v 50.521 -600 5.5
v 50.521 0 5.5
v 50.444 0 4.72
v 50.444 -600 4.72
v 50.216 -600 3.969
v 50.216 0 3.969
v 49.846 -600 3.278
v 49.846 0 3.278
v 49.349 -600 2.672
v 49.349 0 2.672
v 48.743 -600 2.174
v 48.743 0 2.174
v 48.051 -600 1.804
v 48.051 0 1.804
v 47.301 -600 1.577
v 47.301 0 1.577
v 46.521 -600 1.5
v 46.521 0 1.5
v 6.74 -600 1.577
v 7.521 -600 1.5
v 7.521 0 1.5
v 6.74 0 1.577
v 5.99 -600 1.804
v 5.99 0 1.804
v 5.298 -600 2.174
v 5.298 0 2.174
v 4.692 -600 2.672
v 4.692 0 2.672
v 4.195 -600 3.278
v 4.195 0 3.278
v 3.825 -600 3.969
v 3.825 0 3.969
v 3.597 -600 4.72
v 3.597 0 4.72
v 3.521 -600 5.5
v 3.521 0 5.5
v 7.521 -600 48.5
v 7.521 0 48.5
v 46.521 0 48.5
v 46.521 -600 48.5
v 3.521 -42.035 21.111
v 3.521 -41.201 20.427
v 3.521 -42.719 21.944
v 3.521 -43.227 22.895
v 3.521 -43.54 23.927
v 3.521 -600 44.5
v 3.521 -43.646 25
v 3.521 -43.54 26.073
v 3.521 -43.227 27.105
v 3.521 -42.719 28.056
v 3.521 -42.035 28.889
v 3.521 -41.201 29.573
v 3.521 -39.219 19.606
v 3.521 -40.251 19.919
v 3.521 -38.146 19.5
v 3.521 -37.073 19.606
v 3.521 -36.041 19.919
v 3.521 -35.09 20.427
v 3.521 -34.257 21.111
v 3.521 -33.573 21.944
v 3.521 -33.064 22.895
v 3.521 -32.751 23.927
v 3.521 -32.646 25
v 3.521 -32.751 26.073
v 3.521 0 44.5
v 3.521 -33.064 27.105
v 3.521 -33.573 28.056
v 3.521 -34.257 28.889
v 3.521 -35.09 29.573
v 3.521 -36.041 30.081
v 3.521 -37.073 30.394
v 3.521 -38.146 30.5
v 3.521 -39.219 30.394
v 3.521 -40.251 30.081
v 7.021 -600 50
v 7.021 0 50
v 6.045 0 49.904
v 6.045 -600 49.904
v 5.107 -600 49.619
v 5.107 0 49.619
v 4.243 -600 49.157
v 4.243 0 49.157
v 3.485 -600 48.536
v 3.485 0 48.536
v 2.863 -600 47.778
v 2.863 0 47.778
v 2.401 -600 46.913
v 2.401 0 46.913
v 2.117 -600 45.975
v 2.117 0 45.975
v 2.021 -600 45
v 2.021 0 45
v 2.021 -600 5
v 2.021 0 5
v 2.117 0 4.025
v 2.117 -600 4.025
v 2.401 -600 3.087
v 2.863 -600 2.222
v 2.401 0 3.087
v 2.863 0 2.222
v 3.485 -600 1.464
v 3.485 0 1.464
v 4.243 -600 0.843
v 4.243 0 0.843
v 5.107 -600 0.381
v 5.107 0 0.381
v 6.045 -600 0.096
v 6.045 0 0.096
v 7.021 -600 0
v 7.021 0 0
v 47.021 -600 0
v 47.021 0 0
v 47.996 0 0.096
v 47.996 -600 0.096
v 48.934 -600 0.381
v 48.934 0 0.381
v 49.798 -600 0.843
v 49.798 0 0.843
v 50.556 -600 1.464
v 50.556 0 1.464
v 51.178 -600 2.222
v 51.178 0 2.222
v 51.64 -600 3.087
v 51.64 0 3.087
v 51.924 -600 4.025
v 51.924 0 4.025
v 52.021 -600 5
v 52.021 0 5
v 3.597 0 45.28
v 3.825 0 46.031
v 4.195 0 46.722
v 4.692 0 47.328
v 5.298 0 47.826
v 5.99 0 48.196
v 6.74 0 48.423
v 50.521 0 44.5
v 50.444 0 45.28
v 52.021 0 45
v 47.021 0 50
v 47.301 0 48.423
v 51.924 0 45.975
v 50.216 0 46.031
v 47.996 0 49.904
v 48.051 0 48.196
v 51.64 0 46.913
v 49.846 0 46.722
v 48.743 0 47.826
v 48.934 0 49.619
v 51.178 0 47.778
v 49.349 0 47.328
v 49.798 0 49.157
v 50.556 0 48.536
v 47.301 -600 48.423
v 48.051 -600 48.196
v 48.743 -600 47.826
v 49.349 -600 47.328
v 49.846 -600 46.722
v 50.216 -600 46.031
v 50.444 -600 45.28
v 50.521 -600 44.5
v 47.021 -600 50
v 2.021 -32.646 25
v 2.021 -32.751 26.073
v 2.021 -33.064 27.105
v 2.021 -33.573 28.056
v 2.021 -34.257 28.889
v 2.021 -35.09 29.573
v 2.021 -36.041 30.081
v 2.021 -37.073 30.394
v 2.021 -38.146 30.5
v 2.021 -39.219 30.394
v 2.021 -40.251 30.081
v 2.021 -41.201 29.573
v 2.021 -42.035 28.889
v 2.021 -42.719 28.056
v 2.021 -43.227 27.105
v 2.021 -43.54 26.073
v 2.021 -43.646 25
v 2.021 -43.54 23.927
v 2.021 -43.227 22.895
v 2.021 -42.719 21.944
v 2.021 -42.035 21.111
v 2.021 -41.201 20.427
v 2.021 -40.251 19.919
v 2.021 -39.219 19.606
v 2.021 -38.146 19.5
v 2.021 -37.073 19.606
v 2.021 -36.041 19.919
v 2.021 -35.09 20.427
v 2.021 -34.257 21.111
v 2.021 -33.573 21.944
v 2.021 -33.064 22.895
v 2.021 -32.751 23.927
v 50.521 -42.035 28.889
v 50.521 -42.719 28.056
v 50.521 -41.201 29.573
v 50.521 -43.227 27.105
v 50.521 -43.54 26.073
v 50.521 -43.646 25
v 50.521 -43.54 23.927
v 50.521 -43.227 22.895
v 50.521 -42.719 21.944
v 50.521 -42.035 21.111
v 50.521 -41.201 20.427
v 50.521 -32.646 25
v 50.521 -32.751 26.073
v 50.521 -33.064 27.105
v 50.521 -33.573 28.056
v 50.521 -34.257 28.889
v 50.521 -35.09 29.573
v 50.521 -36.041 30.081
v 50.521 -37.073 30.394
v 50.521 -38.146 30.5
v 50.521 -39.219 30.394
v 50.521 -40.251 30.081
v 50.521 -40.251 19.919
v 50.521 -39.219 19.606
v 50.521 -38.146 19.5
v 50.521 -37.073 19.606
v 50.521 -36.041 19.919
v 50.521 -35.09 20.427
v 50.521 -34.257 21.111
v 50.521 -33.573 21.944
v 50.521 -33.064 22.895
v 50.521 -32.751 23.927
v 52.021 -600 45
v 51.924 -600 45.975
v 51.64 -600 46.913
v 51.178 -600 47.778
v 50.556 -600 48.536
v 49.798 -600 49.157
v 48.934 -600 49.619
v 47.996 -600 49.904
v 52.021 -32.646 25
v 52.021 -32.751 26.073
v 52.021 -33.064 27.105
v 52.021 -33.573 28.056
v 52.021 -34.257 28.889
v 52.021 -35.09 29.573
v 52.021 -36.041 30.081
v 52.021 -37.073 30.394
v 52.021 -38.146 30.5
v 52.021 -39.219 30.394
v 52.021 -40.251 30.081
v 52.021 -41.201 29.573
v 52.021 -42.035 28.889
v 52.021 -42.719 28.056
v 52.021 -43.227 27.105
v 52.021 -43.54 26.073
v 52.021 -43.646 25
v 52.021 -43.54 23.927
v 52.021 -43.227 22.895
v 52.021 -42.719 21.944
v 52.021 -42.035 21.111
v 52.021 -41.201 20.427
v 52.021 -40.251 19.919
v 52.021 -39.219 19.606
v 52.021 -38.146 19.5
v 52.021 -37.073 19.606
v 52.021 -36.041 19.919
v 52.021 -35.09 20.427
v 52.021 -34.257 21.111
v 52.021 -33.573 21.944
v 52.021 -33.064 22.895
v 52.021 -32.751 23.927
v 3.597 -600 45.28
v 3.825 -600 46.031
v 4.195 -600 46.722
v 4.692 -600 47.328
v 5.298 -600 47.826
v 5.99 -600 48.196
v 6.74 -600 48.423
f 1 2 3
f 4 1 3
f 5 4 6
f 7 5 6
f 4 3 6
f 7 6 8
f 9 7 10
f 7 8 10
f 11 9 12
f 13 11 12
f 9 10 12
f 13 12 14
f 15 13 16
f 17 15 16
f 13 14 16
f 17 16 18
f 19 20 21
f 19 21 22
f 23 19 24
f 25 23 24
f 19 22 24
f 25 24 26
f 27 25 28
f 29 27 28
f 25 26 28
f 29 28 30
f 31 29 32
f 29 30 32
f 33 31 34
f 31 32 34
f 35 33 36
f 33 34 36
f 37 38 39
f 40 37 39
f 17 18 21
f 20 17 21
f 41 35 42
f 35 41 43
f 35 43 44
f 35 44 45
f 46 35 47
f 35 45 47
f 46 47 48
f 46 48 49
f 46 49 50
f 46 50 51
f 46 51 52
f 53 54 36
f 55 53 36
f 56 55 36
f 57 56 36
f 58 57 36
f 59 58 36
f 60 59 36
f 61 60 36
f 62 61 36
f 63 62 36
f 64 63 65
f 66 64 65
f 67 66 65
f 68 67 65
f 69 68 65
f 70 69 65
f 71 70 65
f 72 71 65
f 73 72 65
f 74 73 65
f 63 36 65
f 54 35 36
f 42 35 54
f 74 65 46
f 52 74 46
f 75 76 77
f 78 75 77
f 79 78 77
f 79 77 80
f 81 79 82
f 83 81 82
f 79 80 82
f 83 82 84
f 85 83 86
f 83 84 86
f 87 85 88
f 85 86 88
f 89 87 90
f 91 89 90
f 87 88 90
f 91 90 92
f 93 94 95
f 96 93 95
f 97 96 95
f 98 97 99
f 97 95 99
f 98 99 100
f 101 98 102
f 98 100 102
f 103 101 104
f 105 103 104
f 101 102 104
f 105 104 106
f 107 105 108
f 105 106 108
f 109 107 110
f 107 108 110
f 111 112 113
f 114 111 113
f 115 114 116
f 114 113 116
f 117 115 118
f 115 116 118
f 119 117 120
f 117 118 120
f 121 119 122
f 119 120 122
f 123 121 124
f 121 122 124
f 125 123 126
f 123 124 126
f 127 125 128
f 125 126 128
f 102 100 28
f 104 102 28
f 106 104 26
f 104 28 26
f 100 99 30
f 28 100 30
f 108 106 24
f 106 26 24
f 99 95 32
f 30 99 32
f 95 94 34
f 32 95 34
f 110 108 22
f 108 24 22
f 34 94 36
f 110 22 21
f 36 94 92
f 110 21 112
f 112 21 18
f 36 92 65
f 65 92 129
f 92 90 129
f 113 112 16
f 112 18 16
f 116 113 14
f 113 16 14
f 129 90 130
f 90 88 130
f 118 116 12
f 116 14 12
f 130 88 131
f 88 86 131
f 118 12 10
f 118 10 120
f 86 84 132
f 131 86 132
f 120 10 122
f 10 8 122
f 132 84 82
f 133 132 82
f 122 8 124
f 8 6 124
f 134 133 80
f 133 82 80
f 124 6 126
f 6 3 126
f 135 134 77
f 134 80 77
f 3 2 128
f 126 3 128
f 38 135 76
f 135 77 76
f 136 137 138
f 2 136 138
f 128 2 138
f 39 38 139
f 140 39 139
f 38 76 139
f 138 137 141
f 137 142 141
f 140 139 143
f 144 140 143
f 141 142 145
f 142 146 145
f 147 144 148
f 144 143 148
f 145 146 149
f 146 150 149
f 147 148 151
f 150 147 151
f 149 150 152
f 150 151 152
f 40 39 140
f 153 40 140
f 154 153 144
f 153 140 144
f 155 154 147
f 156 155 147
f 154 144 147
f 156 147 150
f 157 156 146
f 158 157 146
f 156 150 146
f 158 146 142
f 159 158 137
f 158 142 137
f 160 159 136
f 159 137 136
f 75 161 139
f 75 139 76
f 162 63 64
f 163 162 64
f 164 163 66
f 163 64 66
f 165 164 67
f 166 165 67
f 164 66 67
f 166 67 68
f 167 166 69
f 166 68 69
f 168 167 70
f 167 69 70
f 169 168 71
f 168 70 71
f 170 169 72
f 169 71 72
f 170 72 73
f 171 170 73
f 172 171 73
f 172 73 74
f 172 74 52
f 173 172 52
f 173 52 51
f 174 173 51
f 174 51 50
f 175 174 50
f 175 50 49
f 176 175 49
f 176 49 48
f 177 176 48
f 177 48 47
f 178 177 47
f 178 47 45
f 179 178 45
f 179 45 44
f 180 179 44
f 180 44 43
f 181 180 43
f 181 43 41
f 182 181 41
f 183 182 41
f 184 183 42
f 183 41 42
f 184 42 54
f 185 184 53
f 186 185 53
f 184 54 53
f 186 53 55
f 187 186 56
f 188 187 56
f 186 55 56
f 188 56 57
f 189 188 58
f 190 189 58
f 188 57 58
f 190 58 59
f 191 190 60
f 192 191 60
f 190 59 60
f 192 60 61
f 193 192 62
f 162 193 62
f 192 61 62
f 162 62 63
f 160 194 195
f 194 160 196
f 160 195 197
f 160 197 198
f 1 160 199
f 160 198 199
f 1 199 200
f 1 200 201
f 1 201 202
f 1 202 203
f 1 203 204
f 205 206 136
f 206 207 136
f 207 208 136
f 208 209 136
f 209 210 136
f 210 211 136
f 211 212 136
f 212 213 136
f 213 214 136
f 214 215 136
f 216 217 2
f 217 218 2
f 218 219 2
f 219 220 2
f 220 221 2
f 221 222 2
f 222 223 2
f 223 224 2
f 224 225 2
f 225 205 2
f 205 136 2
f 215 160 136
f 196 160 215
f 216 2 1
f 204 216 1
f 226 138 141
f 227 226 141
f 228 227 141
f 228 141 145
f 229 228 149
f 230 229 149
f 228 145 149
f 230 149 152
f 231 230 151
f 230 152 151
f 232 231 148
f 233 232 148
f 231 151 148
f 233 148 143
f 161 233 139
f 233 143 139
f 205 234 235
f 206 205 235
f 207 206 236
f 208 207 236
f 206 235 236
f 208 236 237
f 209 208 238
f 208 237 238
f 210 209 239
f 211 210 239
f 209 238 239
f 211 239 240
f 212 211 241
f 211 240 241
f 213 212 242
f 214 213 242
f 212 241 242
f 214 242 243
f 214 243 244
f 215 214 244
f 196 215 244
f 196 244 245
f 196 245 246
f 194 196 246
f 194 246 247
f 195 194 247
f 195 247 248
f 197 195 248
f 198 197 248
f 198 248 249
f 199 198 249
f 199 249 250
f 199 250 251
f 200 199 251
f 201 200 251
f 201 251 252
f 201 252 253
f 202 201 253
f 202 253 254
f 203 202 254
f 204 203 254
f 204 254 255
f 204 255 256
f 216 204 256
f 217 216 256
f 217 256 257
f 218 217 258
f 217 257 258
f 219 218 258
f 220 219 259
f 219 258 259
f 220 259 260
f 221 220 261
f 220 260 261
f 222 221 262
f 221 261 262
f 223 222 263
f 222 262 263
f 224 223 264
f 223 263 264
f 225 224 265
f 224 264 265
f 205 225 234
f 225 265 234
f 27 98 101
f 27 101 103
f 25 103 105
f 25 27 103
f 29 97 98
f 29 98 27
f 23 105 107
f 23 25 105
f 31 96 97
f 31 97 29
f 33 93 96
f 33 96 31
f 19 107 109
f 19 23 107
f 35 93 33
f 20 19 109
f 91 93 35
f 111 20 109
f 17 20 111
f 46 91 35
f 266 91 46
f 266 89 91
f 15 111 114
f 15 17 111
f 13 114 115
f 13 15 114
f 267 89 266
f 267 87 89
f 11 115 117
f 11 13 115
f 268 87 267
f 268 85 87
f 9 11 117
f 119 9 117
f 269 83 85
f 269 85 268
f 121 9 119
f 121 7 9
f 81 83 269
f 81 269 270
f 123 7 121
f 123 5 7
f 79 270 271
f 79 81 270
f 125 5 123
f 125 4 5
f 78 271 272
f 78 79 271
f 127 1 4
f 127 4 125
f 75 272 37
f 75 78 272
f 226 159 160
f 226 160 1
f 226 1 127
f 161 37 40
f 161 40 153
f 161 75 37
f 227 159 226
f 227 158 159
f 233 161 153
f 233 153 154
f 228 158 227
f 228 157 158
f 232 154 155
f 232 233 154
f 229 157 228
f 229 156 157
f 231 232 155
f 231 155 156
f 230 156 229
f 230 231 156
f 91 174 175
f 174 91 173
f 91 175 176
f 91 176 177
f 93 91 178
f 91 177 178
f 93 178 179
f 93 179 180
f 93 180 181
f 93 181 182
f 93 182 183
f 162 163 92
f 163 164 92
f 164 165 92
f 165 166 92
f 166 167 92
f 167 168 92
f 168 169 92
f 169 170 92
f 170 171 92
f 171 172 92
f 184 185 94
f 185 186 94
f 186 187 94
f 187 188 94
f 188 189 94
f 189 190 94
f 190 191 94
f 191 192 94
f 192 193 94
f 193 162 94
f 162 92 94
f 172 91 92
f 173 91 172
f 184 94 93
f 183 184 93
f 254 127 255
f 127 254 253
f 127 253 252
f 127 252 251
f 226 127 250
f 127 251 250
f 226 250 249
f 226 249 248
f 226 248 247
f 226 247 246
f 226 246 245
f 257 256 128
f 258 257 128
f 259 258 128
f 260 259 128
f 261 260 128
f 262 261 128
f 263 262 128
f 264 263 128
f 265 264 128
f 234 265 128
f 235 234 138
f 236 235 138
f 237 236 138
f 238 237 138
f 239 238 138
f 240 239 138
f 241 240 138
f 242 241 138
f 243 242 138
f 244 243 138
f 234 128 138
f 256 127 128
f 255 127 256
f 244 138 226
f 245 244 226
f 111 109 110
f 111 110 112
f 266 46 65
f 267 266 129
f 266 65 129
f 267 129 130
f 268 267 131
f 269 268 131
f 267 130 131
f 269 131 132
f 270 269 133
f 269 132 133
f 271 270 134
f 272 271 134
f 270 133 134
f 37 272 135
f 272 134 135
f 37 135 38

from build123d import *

# Parameters (mm, degrees)
F1_DEPTH = 600
F2_R     = 5.5
F3_DEPTH = 100


with BuildPart() as f1:
    # F0 (on Front) → F1 (new body)
    with BuildSketch(Plane.XZ):
        with BuildLine():
            ThreePointArc((2.020508, 5), (3.484974, 1.464466), (7.020508, 0))
            Line((7.020508, 0), (47.020508, 0))
            ThreePointArc((47.020508, 0), (50.556042, 1.464466), (52.020508, 5))
            Line((52.020508, 5), (52.020508, 45))
            ThreePointArc((52.020508, 45), (50.556042, 48.535534), (47.020508, 50))
            Line((47.020508, 50), (7.020508, 50))
            ThreePointArc((7.020508, 50), (3.484974, 48.535534), (2.020508, 45))
            Line((2.020508, 45), (2.020508, 5))
        make_face()
        with BuildLine():
            ThreePointArc((7.520508, 1.5), (4.692081, 2.671573), (3.520508, 5.5))
            Line((3.520508, 5.5), (3.520508, 44.5))
            ThreePointArc((3.520508, 44.5), (4.692081, 47.328427), (7.520508, 48.5))
            Line((7.520508, 48.5), (46.520508, 48.5))
            ThreePointArc((46.520508, 48.5), (49.348935, 47.328427), (50.520508, 44.5))
            Line((50.520508, 44.5), (50.520508, 5.5))
            ThreePointArc((50.520508, 5.5), (49.348935, 2.671573), (46.520508, 1.5))
            Line((46.520508, 1.5), (7.520508, 1.5))
        make_face(mode=Mode.SUBTRACT)
    extrude(amount=F1_DEPTH)

    # F2 (on face) → F3 (cut)
    with BuildSketch(Plane.YZ.offset(52.020508)):
        with Locations((-38.1458, 25)):
            Circle(F2_R)
    extrude(amount=-F3_DEPTH, mode=Mode.SUBTRACT)


solid = f1.part
